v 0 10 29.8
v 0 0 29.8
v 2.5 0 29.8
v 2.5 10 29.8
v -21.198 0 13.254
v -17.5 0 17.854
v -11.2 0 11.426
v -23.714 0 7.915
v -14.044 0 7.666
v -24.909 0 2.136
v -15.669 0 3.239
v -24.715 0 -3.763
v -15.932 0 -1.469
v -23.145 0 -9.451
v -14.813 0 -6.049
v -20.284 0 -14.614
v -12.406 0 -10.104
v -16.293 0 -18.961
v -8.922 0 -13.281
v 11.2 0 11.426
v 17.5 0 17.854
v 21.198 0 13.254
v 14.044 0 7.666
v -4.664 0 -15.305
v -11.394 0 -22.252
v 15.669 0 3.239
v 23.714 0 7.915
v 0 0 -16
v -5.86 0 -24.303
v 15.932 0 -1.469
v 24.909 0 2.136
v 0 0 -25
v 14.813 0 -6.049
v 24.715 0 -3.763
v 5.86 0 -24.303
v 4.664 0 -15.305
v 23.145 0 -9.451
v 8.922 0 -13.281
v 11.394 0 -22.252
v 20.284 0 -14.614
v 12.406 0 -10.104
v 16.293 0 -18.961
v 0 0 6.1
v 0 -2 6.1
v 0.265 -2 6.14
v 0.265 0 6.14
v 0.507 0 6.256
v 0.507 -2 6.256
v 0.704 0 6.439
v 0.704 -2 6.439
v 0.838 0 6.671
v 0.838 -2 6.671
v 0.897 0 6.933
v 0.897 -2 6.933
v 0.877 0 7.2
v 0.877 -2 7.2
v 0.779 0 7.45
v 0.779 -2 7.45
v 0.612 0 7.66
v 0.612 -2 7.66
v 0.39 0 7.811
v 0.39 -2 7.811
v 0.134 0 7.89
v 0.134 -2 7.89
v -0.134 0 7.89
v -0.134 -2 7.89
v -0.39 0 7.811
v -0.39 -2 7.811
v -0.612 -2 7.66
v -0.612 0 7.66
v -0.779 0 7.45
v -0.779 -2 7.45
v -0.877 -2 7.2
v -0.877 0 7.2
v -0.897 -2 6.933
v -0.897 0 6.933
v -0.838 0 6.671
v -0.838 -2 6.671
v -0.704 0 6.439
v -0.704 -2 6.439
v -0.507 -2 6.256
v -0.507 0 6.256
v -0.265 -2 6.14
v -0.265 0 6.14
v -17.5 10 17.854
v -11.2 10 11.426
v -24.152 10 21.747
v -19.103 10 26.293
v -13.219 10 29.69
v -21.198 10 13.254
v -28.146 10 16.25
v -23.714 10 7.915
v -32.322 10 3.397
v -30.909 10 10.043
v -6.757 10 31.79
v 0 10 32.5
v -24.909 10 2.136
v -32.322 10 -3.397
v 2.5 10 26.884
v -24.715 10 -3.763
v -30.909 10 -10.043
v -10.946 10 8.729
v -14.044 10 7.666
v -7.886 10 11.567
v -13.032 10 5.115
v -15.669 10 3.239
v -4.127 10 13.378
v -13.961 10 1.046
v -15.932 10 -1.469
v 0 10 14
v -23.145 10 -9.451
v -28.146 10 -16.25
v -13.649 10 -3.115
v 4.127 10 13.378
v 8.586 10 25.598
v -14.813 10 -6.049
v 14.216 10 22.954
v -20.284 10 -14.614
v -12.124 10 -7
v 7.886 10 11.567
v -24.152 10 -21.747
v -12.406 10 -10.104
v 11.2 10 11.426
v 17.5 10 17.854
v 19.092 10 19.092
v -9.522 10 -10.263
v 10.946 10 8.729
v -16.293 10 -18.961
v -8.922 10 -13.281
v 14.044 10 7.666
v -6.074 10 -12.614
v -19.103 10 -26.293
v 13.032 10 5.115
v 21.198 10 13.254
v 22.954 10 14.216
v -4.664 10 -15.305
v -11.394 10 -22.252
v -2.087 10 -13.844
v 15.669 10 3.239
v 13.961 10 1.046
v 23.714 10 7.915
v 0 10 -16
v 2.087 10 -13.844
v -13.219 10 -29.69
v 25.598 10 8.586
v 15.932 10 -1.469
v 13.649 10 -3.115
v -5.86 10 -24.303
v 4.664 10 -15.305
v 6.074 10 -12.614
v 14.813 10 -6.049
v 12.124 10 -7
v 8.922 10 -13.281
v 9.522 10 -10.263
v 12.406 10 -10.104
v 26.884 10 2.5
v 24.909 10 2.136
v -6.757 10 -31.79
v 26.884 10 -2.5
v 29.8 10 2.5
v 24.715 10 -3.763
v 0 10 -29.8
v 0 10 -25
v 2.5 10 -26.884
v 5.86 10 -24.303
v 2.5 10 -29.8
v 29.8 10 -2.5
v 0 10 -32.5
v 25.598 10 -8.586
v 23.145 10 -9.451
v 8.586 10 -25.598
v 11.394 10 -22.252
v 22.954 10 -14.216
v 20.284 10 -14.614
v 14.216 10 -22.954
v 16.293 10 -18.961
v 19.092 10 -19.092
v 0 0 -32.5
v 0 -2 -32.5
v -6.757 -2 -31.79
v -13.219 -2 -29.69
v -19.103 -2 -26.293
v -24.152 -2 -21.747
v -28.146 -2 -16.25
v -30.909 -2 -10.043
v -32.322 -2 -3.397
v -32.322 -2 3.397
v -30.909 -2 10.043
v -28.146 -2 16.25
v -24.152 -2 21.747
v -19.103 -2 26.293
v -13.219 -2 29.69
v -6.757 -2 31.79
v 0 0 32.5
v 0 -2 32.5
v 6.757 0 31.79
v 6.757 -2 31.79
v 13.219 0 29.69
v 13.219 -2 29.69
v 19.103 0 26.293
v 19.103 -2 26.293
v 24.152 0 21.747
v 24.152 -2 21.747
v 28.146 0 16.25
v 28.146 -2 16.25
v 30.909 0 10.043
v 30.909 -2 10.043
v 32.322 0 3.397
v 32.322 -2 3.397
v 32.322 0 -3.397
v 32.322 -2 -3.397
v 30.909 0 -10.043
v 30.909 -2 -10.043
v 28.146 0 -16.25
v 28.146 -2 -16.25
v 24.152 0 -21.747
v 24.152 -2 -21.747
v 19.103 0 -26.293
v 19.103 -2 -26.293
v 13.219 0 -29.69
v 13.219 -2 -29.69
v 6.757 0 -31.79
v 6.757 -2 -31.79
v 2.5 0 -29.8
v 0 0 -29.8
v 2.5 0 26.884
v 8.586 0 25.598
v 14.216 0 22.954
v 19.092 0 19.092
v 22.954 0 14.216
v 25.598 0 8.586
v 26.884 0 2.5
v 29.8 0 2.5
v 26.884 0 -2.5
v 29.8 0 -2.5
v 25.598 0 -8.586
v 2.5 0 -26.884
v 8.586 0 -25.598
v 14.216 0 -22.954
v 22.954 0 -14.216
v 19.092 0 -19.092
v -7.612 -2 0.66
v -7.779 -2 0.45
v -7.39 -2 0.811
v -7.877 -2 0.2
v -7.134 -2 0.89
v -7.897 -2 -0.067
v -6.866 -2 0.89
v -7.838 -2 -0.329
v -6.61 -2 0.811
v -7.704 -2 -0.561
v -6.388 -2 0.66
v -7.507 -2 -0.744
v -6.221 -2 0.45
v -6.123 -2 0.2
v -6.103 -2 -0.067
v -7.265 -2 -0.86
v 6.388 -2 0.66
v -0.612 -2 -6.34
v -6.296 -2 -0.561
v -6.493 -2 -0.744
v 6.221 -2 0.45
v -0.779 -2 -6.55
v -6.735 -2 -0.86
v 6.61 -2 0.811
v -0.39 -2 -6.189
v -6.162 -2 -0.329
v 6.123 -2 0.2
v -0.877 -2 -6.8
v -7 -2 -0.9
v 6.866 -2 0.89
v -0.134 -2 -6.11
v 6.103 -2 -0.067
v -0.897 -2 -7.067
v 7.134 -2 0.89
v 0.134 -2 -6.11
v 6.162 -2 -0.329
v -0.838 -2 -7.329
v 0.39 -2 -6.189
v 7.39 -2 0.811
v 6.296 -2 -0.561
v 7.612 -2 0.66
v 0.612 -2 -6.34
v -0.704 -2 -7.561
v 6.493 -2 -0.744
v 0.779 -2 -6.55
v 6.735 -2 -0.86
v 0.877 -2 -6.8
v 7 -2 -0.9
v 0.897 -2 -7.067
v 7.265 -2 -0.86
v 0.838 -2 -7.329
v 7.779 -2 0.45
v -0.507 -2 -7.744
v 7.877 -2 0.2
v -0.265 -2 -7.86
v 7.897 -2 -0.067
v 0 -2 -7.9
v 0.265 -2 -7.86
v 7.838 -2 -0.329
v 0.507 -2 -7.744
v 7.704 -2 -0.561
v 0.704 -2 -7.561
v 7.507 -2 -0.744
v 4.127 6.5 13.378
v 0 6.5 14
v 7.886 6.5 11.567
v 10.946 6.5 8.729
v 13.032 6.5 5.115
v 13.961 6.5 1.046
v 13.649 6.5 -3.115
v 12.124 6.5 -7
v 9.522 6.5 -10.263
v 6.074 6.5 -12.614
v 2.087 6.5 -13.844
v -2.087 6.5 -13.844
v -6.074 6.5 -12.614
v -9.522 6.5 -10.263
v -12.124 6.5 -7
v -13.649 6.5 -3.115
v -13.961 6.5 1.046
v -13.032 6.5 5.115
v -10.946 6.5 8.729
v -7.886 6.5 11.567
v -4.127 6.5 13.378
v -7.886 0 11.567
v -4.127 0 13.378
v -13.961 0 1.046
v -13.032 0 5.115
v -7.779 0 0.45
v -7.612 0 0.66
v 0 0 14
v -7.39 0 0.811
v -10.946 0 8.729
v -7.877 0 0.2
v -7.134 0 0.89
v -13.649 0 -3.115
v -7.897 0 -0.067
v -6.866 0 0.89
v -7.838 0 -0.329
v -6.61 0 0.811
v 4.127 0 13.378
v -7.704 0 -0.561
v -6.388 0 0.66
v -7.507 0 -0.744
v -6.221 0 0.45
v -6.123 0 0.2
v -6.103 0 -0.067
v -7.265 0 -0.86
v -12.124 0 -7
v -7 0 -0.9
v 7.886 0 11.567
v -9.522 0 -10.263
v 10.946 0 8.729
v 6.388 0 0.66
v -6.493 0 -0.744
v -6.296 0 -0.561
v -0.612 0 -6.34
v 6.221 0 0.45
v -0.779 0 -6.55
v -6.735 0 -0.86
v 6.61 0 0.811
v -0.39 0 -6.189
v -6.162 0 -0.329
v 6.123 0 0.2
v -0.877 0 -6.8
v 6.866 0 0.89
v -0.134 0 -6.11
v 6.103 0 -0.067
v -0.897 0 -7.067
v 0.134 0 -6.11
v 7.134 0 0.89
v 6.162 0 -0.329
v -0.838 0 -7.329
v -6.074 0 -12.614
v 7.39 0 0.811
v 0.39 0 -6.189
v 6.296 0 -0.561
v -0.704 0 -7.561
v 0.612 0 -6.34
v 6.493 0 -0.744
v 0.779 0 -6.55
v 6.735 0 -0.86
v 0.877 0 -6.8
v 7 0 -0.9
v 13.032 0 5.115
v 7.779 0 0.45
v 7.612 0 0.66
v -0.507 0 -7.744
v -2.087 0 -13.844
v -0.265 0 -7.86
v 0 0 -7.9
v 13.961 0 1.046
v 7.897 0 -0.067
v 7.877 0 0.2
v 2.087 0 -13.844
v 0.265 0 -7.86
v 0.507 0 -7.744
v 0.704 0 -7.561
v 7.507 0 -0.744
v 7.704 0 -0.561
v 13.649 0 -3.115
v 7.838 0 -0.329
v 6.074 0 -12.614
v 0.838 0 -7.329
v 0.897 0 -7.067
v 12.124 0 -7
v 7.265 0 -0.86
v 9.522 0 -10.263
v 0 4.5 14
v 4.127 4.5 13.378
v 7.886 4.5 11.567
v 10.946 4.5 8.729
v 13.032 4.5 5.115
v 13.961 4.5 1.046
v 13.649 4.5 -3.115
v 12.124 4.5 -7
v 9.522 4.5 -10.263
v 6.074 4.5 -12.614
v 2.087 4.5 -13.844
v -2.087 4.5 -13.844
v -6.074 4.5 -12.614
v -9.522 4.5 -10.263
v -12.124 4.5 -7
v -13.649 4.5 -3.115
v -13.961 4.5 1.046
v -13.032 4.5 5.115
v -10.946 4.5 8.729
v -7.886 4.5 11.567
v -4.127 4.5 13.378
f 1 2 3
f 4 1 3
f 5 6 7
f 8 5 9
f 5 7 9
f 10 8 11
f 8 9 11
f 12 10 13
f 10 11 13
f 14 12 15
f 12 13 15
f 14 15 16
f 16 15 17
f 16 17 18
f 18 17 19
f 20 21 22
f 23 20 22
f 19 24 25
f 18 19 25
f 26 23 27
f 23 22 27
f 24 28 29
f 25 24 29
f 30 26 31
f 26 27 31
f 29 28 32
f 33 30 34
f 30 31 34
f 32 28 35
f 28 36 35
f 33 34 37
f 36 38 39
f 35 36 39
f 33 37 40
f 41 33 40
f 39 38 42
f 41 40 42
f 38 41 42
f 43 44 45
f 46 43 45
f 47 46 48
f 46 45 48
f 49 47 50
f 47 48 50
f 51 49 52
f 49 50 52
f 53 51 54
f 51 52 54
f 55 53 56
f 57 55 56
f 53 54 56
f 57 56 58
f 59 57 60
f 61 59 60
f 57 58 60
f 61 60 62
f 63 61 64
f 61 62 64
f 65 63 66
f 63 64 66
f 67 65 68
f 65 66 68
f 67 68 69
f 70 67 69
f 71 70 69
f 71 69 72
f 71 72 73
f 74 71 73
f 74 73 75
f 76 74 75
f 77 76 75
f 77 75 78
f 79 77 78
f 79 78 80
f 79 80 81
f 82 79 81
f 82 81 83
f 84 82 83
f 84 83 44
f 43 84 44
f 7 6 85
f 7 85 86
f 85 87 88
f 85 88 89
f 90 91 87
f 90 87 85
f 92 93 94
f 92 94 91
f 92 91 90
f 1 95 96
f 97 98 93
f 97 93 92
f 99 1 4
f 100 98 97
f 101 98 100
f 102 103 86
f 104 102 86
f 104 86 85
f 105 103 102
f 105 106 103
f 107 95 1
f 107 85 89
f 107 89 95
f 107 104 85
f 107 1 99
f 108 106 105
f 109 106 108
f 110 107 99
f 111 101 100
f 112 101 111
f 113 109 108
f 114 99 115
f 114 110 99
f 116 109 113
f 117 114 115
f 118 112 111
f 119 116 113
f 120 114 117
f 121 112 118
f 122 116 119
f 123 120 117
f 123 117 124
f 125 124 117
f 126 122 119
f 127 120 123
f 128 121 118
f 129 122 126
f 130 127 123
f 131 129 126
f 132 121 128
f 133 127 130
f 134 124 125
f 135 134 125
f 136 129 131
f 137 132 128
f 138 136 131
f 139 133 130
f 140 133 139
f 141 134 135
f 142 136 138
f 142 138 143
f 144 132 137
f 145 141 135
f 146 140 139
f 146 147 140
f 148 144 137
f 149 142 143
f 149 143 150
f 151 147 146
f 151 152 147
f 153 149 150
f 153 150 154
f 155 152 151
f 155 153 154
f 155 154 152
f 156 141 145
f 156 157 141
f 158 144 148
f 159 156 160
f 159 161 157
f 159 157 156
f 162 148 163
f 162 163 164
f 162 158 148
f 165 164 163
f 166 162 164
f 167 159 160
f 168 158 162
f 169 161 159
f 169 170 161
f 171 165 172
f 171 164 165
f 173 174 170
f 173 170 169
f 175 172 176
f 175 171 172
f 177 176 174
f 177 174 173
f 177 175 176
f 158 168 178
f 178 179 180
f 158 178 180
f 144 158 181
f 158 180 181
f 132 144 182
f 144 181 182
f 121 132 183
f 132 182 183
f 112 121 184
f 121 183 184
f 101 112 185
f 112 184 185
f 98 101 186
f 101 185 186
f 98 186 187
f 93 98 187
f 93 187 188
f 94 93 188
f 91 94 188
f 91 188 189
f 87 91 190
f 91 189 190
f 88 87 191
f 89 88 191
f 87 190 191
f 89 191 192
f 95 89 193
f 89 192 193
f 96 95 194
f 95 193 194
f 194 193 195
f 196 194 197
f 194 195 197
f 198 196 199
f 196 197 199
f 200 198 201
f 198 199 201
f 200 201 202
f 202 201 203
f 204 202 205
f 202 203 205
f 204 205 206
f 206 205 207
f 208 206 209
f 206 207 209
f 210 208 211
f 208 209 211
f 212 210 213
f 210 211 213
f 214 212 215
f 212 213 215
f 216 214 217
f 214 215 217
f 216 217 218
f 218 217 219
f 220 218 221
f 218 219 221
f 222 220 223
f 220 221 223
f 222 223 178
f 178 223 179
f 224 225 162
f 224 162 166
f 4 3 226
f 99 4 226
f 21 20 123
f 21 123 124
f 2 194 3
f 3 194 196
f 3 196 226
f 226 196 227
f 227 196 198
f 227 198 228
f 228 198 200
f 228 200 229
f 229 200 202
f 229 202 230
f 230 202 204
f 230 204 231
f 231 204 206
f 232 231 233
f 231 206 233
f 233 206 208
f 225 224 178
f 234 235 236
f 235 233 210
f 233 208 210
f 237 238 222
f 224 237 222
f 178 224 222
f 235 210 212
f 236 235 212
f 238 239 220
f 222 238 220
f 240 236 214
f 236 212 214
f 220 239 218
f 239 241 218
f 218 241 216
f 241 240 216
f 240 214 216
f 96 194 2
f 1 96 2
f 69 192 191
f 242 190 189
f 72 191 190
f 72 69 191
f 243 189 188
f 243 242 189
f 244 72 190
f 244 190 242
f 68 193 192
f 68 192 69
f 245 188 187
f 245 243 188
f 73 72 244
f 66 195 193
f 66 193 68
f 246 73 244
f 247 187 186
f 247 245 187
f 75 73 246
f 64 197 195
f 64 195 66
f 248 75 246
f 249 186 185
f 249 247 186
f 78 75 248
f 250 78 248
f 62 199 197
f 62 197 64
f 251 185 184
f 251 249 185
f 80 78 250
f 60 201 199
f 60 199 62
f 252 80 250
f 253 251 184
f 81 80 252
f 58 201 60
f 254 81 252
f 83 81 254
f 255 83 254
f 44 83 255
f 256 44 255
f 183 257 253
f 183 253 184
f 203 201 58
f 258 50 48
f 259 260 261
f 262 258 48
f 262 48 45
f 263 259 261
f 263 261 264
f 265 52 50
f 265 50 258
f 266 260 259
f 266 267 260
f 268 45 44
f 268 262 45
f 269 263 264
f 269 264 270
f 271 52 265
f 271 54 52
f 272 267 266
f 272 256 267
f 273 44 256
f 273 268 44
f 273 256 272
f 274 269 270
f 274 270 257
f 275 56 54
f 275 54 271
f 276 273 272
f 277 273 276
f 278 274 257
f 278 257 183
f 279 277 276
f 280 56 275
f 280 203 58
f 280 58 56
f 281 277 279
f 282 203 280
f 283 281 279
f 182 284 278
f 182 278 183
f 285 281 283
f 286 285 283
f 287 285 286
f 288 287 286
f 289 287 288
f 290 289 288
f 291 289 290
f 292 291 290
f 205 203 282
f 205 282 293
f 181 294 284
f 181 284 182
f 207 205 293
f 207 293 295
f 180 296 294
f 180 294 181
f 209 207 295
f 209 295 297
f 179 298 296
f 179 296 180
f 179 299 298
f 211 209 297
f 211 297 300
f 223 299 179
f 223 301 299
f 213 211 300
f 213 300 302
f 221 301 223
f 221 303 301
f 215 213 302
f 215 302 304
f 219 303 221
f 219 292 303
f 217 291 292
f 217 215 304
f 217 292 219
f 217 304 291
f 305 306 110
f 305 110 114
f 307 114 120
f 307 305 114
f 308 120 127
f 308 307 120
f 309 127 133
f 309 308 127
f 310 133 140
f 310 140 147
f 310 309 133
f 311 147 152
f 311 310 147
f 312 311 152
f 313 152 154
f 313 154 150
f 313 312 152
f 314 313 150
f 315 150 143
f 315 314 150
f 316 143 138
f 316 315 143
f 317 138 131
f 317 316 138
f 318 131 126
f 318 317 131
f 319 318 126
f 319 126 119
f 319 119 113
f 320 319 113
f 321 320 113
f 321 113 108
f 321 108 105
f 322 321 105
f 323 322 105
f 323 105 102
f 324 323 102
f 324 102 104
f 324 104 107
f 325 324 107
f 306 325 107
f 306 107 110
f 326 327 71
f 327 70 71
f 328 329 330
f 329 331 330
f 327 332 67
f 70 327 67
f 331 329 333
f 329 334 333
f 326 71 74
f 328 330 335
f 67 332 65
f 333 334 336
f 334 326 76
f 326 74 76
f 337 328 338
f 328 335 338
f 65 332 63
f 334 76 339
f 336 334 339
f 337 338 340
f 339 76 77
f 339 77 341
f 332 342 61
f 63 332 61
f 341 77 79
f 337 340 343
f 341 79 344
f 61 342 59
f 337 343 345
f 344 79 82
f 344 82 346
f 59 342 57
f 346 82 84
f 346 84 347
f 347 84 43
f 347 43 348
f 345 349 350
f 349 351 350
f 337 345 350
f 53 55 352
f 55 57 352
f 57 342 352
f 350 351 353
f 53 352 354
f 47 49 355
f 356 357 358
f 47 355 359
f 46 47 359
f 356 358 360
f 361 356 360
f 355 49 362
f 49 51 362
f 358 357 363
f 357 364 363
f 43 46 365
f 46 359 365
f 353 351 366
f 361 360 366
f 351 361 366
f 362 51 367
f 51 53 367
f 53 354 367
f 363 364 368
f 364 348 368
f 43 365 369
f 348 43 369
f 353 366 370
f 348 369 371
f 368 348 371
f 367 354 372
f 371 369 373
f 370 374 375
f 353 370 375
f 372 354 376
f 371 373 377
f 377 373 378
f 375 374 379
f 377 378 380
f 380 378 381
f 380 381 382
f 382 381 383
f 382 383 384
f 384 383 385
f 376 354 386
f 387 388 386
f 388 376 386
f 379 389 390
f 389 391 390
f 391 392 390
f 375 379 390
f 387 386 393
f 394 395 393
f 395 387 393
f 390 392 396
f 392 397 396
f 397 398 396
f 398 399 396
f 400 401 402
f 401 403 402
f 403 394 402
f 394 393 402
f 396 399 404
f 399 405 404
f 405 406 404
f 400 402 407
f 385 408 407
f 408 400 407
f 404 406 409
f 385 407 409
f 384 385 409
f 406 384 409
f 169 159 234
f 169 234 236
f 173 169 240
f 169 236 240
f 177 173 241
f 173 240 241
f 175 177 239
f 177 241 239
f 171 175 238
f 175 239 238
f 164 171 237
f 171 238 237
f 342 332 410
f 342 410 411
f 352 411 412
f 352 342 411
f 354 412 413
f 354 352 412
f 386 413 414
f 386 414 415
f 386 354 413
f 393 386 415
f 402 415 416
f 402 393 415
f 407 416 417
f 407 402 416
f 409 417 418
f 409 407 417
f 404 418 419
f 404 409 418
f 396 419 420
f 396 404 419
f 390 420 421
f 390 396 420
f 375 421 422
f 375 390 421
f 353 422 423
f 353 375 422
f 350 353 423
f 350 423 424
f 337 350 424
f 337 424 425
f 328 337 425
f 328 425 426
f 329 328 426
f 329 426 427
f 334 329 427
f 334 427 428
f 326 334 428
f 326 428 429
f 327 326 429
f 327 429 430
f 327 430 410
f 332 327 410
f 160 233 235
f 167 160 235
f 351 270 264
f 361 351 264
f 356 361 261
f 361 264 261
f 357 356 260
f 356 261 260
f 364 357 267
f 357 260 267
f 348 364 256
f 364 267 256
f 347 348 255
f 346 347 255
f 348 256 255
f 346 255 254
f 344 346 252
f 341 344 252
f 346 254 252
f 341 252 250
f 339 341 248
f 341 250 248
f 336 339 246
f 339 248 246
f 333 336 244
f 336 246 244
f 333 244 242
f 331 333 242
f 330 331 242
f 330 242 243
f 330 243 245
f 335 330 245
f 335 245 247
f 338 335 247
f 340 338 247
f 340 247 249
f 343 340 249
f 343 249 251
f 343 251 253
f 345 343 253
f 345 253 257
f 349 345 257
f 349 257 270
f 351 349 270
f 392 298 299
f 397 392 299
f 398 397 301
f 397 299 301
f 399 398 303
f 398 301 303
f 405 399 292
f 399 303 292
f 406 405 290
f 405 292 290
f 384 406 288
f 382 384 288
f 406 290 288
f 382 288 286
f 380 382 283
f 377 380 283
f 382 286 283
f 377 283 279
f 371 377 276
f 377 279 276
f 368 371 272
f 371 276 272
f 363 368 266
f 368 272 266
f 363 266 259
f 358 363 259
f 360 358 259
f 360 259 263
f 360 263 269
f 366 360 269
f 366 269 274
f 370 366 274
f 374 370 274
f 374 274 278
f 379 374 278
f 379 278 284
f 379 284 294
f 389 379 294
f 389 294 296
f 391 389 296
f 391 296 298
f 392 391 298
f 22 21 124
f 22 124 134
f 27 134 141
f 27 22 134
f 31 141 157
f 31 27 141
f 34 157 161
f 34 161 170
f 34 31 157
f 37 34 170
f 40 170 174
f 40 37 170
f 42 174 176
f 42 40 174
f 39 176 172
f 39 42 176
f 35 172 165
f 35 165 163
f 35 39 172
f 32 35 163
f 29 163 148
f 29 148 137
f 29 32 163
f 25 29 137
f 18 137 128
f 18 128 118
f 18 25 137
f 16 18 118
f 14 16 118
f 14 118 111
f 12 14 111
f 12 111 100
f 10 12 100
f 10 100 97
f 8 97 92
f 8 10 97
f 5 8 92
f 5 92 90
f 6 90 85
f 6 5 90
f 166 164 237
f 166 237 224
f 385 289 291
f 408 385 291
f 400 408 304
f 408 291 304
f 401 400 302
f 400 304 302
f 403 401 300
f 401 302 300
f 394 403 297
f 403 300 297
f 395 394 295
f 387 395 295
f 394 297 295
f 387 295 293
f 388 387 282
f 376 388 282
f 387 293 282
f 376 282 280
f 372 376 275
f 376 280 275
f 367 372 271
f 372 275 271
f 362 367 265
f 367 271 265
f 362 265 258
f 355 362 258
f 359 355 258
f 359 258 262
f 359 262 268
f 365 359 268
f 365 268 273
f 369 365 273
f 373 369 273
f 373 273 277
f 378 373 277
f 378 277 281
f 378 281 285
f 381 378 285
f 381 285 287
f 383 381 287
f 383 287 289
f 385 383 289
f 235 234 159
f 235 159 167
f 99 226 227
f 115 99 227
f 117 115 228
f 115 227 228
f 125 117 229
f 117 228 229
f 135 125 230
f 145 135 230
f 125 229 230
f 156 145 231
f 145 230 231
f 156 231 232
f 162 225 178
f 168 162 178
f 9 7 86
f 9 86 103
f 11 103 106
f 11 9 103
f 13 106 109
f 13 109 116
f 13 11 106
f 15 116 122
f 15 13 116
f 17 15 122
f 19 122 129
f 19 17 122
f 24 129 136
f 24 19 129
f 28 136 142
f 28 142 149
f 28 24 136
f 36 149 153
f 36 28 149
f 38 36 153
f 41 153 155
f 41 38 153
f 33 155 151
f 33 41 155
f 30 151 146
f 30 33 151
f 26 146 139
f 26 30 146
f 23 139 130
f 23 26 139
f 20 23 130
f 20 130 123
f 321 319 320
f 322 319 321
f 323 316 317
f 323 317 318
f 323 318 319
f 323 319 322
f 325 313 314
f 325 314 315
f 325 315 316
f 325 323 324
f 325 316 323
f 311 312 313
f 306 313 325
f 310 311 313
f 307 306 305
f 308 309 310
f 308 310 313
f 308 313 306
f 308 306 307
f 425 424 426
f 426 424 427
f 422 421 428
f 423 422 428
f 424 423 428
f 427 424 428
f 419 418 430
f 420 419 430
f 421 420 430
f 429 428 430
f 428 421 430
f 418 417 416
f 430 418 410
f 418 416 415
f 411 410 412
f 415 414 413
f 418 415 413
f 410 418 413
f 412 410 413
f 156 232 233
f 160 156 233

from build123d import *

# Parameters (mm, degrees)
SKETCH1_R           = 27
SKETCH1_R_2         = 14
BOSS_EXTRUDE1_DEPTH = 10
SKETCH2_R           = 32.5
BOSS_EXTRUDE2_DEPTH = 2
SKETCH3_W           = 5
SKETCH3_H           = 4.39677325
SKETCH3_W_2         = 4.39677325
SKETCH3_H_2         = 5
BOSS_EXTRUDE3_DEPTH = 10
CUT_EXTRUDE1_REACH  = 49.503
SKETCH4_R           = 0.9
BOSS_EXTRUDE4_DEPTH = 10
BOSS_EXTRUDE5_START = -2
SKETCH6_R           = 14
BOSS_EXTRUDE5_DEPTH = 2


with BuildPart() as part:
    # Sketch1 → Boss-Extrude1 (new body)
    with BuildSketch(Plane(origin=(0, 0, 0), x_dir=(1, 0, 0), z_dir=(0, 1, 0))):
        with Locations(Location((0, 0, 0), (0, 0, 270))):
            Circle(SKETCH1_R)
        with Locations(Location((0, 0, 0), (0, 0, 270))):
            Circle(SKETCH1_R_2, mode=Mode.SUBTRACT)
        with BuildLine():
            Line((-17.5, -17.853571071), (-11.2, -11.426285486))
            ThreePointArc((-11.2, -11.426285486), (0, 16), (11.2, -11.426285486))
            Line((11.2, -11.426285486), (17.5, -17.853571071))
            ThreePointArc((17.5, -17.853571071), (0, 25), (-17.5, -17.853571071))
        make_face(mode=Mode.SUBTRACT)
    extrude(amount=BOSS_EXTRUDE1_DEPTH)

    # Sketch2 → Boss-Extrude2 (add)
    with BuildSketch(Plane.XZ):
        with Locations(Location((0, 0, 0), (0, 0, 270))):
            Circle(SKETCH2_R)
    extrude(amount=BOSS_EXTRUDE2_DEPTH)

    # Sketch3 → Boss-Extrude3 (add)
    with BuildSketch(Plane(origin=(0, 0, 0), x_dir=(1, 0, 0), z_dir=(0, 1, 0))):
        with Locations((0, 27.601613375)):
            Rectangle(SKETCH3_W, SKETCH3_H)
        with Locations((27.601613375, 0)):
            Rectangle(SKETCH3_W_2, SKETCH3_H_2)
        with Locations((0, -27.601613375)):
            Rectangle(SKETCH3_W, SKETCH3_H)
        with Locations((-27.601613375, 0)):
            Rectangle(SKETCH3_W_2, SKETCH3_H_2)
    extrude(amount=BOSS_EXTRUDE3_DEPTH)

    # Sketch4 → Cut-Extrude1 (cut, up to next)
    with BuildSketch(Plane.XZ.offset(2), mode=Mode.PRIVATE) as cut_extrude1_sk1:
        with Locations(Location((0, -7, 0), (0, 0, 270))):
            Circle(SKETCH4_R)
    cut_extrude1_tool1 = extrude(cut_extrude1_sk1.sketch, amount=-CUT_EXTRUDE1_REACH, mode=Mode.PRIVATE) & part.part
    # Sketch4 → Cut-Extrude1 (cut, up to next)
    with BuildSketch(Plane.XZ.offset(2), mode=Mode.PRIVATE) as cut_extrude1_sk2:
        with Locations(Location((-7, 0, 0), (0, 0, 270))):
            Circle(SKETCH4_R)
    cut_extrude1_tool2 = extrude(cut_extrude1_sk2.sketch, amount=-CUT_EXTRUDE1_REACH, mode=Mode.PRIVATE) & part.part
    # Sketch4 → Cut-Extrude1 (cut, up to next)
    with BuildSketch(Plane.XZ.offset(2), mode=Mode.PRIVATE) as cut_extrude1_sk3:
        with Locations(Location((0, 7, 0), (0, 0, 270))):
            Circle(SKETCH4_R)
    cut_extrude1_tool3 = extrude(cut_extrude1_sk3.sketch, amount=-CUT_EXTRUDE1_REACH, mode=Mode.PRIVATE) & part.part
    # Sketch4 → Cut-Extrude1 (cut, up to next)
    with BuildSketch(Plane.XZ.offset(2), mode=Mode.PRIVATE) as cut_extrude1_sk4:
        with Locations(Location((7, 0, 0), (0, 0, 270))):
            Circle(SKETCH4_R)
    cut_extrude1_tool4 = extrude(cut_extrude1_sk4.sketch, amount=-CUT_EXTRUDE1_REACH, mode=Mode.PRIVATE) & part.part
    add(cut_extrude1_tool1.solids().sort_by_distance((0, -2, -7))[0], mode=Mode.SUBTRACT)
    add(cut_extrude1_tool2.solids().sort_by_distance((-7, -2, 0))[0], mode=Mode.SUBTRACT)
    add(cut_extrude1_tool3.solids().sort_by_distance((0, -2, 7))[0], mode=Mode.SUBTRACT)
    add(cut_extrude1_tool4.solids().sort_by_distance((7, -2, 0))[0], mode=Mode.SUBTRACT)

    # Sketch5 → Boss-Extrude4 (add)
    with BuildSketch(Plane(origin=(0, 0, 0), x_dir=(1, 0, 0), z_dir=(0, 1, 0))):
        with BuildLine():
            Line((0, 29.8), (0, 32.5))
            ThreePointArc((0, 32.5), (-32.5, 0), (0, -32.5))
            Line((0, -32.5), (0, -29.8))
            Line((0, -29.8), (-2.5, -29.8))
            Line((-2.5, -29.8), (-2.5, -26.884010118))
            ThreePointArc((-2.5, -26.884010118), (-19.091883092, -19.091883092), (-26.884010118, -2.5))
            Line((-26.884010118, -2.5), (-29.8, -2.5))
            Line((-29.8, -2.5), (-29.8, 2.5))
            Line((-29.8, 2.5), (-26.884010118, 2.5))
            ThreePointArc((-26.884010118, 2.5), (-19.091883092, 19.091883092), (-2.5, 26.884010118))
            Line((-2.5, 26.884010118), (-2.5, 29.8))
            Line((-2.5, 29.8), (0, 29.8))
        make_face()
    extrude(amount=BOSS_EXTRUDE4_DEPTH)

    # Sketch6 → Boss-Extrude5 (add)
    with BuildSketch(Plane(origin=(0, 6.5, 0), x_dir=(1, 0, 0), z_dir=(0, 1, 0)).offset(BOSS_EXTRUDE5_START)):
        with Locations(Location((0, 0, 0), (0, 0, 270))):
            Circle(SKETCH6_R)
    extrude(amount=BOSS_EXTRUDE5_DEPTH)


solid = part.part
